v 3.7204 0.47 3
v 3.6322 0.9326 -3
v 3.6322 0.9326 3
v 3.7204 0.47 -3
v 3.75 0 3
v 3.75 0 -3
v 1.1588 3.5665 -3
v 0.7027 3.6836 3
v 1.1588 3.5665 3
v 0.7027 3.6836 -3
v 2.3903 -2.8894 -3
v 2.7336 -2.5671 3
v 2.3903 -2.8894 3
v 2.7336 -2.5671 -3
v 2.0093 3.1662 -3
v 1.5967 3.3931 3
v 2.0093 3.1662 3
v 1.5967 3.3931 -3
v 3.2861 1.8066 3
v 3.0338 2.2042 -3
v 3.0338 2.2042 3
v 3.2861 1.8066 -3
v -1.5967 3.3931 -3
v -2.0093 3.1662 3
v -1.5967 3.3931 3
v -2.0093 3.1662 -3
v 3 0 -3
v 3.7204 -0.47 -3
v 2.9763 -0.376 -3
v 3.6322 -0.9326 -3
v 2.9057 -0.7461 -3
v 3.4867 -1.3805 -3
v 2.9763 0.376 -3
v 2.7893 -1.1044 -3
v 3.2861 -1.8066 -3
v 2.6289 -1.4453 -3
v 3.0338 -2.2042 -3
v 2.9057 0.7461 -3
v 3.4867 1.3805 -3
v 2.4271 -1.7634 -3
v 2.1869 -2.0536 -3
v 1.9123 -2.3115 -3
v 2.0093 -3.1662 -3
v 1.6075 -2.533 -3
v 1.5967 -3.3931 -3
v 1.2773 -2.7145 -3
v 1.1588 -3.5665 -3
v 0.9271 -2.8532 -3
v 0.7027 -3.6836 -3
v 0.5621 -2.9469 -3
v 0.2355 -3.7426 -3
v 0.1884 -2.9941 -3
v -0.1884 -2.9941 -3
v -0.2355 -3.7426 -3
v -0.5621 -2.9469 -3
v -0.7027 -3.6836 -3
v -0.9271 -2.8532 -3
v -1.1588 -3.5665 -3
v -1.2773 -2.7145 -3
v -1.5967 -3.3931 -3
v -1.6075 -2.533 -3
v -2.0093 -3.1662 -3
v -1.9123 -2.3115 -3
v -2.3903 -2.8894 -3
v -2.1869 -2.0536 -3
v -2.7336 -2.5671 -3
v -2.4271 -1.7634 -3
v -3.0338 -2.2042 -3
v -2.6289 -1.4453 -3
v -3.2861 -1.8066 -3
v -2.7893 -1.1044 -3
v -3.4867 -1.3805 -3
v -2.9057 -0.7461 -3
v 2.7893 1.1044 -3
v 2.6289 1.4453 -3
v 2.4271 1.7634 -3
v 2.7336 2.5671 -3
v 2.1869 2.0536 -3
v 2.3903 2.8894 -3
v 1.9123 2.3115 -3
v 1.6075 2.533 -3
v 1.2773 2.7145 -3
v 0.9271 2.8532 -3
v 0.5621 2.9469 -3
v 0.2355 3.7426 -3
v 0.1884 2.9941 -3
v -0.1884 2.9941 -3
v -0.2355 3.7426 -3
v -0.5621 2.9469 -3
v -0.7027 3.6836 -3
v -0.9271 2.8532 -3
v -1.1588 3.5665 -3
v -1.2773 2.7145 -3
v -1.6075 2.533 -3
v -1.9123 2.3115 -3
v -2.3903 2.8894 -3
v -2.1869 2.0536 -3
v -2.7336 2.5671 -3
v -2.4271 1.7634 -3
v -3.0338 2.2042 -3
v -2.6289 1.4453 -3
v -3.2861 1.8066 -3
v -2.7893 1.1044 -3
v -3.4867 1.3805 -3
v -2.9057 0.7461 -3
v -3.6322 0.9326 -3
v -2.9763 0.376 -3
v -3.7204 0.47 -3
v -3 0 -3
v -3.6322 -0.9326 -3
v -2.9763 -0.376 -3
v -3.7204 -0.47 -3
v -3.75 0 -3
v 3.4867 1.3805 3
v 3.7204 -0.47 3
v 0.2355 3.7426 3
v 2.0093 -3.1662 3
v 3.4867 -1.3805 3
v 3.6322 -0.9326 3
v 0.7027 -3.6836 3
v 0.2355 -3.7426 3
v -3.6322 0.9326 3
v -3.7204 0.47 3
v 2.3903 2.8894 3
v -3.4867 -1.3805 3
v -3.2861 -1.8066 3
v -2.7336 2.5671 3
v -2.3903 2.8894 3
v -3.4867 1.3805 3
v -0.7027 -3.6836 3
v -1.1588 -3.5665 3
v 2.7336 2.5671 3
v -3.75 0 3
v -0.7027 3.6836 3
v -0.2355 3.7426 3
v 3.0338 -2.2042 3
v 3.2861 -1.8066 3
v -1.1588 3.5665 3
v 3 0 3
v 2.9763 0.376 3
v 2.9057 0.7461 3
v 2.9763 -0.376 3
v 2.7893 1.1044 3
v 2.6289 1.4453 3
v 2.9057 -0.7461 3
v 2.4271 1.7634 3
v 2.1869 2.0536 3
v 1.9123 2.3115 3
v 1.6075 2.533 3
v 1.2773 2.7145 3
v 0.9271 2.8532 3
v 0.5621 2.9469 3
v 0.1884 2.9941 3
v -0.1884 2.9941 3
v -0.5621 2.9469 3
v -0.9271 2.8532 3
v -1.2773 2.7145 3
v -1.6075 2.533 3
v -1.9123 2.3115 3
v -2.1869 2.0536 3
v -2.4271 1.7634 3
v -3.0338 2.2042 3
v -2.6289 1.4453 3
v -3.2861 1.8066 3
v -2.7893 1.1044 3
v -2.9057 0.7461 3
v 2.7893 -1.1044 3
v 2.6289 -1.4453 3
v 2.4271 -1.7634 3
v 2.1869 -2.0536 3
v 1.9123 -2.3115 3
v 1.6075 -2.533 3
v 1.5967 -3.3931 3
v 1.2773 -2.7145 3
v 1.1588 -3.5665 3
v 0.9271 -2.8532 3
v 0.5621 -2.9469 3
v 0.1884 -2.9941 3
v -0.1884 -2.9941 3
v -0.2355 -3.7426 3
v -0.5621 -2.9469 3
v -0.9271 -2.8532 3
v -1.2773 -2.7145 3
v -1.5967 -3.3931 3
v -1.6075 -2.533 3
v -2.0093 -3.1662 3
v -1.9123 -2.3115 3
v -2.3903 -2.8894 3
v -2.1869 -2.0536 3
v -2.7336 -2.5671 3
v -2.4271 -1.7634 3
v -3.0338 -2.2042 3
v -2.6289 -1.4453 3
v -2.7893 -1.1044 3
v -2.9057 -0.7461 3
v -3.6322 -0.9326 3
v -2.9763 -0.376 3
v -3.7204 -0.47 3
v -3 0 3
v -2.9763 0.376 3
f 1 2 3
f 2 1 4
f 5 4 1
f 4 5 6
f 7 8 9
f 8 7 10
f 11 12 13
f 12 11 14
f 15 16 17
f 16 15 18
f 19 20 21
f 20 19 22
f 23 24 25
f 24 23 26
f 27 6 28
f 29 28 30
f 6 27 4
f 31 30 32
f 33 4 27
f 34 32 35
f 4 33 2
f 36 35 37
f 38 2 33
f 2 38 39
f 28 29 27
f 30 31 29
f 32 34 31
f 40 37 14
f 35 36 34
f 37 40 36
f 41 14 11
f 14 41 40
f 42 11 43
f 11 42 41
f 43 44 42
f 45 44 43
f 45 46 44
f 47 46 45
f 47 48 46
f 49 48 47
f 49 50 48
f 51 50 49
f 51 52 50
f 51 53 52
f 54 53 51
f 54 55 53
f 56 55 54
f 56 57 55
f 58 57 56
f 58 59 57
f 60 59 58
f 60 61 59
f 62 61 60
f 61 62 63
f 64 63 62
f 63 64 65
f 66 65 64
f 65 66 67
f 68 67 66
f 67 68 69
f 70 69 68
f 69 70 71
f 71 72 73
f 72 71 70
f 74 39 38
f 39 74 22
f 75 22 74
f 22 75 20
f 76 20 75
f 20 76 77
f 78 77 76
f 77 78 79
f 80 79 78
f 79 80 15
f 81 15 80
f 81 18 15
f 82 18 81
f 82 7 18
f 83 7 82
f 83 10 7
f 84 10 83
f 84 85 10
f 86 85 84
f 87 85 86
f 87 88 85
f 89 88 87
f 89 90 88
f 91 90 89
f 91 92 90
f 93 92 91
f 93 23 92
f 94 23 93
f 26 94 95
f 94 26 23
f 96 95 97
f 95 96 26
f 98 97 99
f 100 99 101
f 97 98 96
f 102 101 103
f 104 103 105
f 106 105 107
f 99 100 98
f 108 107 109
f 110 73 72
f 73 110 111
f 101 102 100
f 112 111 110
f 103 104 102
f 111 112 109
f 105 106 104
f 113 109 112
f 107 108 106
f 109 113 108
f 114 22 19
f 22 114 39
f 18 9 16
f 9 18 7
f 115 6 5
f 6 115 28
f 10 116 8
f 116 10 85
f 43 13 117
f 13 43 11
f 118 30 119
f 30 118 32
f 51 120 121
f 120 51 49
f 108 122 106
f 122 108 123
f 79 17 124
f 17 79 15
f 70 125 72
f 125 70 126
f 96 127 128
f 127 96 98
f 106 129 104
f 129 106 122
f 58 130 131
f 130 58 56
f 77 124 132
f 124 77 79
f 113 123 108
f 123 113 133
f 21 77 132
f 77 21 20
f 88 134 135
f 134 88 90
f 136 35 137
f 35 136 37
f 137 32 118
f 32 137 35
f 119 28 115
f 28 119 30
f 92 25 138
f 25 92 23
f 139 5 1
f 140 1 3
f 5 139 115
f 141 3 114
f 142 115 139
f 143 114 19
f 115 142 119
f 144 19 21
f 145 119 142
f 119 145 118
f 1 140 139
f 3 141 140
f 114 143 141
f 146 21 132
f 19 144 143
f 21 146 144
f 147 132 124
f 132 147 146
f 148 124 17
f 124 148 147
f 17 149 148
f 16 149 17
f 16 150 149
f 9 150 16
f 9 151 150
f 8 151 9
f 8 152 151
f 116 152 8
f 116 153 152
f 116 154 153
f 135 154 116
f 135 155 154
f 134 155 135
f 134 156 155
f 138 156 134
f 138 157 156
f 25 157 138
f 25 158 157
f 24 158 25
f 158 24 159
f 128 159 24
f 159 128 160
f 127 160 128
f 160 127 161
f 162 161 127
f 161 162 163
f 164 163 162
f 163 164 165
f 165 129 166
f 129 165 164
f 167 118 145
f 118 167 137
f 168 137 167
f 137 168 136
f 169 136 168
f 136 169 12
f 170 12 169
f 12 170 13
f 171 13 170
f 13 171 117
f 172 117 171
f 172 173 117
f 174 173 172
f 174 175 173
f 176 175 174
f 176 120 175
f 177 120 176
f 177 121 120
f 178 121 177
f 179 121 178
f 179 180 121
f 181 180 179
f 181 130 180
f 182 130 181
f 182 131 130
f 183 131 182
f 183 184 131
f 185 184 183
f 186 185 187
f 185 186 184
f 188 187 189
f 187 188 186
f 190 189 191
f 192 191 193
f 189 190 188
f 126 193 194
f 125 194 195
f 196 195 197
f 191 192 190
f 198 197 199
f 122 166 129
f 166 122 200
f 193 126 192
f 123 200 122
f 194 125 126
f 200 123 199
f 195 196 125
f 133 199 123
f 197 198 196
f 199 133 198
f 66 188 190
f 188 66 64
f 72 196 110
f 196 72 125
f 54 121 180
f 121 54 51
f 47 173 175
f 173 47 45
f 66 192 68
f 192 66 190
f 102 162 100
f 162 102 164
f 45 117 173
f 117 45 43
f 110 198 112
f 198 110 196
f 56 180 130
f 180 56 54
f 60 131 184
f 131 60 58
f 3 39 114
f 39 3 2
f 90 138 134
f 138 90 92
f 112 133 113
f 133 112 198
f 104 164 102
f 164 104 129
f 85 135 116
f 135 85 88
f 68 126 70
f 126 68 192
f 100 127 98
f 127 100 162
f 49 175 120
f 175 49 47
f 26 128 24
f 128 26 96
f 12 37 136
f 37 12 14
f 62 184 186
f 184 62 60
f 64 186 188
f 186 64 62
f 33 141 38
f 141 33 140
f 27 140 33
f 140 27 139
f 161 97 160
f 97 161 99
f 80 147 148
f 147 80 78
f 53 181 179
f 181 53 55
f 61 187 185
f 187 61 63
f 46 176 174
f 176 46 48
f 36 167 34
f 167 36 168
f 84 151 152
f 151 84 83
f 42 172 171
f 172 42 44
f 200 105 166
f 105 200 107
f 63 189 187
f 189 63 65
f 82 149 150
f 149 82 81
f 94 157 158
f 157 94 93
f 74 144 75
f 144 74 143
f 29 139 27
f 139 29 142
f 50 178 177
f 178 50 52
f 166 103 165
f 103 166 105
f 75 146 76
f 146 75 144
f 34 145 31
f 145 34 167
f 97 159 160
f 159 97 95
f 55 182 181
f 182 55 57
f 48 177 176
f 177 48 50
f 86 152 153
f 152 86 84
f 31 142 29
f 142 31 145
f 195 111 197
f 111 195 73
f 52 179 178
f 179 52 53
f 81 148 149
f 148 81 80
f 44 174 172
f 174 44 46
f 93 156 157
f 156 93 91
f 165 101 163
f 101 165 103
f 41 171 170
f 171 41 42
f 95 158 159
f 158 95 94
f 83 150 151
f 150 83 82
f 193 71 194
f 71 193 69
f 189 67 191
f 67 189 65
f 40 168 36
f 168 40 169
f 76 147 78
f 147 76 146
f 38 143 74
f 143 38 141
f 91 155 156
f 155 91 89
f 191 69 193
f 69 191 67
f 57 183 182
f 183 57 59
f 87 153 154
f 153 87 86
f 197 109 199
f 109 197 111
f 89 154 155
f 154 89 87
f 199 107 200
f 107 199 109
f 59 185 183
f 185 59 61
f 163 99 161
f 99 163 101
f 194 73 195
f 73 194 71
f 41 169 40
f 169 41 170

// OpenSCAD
$fn = 50;


difference() {
	union() {
		translate(v = [0, 0, -3.0000000000]) {
			cylinder(h = 6, r = 3.7500000000);
		}
	}
	union() {
		translate(v = [0, 0, -100.0000000000]) {
			cylinder(h = 200, r = 3.0000000000);
		}
	}
}
